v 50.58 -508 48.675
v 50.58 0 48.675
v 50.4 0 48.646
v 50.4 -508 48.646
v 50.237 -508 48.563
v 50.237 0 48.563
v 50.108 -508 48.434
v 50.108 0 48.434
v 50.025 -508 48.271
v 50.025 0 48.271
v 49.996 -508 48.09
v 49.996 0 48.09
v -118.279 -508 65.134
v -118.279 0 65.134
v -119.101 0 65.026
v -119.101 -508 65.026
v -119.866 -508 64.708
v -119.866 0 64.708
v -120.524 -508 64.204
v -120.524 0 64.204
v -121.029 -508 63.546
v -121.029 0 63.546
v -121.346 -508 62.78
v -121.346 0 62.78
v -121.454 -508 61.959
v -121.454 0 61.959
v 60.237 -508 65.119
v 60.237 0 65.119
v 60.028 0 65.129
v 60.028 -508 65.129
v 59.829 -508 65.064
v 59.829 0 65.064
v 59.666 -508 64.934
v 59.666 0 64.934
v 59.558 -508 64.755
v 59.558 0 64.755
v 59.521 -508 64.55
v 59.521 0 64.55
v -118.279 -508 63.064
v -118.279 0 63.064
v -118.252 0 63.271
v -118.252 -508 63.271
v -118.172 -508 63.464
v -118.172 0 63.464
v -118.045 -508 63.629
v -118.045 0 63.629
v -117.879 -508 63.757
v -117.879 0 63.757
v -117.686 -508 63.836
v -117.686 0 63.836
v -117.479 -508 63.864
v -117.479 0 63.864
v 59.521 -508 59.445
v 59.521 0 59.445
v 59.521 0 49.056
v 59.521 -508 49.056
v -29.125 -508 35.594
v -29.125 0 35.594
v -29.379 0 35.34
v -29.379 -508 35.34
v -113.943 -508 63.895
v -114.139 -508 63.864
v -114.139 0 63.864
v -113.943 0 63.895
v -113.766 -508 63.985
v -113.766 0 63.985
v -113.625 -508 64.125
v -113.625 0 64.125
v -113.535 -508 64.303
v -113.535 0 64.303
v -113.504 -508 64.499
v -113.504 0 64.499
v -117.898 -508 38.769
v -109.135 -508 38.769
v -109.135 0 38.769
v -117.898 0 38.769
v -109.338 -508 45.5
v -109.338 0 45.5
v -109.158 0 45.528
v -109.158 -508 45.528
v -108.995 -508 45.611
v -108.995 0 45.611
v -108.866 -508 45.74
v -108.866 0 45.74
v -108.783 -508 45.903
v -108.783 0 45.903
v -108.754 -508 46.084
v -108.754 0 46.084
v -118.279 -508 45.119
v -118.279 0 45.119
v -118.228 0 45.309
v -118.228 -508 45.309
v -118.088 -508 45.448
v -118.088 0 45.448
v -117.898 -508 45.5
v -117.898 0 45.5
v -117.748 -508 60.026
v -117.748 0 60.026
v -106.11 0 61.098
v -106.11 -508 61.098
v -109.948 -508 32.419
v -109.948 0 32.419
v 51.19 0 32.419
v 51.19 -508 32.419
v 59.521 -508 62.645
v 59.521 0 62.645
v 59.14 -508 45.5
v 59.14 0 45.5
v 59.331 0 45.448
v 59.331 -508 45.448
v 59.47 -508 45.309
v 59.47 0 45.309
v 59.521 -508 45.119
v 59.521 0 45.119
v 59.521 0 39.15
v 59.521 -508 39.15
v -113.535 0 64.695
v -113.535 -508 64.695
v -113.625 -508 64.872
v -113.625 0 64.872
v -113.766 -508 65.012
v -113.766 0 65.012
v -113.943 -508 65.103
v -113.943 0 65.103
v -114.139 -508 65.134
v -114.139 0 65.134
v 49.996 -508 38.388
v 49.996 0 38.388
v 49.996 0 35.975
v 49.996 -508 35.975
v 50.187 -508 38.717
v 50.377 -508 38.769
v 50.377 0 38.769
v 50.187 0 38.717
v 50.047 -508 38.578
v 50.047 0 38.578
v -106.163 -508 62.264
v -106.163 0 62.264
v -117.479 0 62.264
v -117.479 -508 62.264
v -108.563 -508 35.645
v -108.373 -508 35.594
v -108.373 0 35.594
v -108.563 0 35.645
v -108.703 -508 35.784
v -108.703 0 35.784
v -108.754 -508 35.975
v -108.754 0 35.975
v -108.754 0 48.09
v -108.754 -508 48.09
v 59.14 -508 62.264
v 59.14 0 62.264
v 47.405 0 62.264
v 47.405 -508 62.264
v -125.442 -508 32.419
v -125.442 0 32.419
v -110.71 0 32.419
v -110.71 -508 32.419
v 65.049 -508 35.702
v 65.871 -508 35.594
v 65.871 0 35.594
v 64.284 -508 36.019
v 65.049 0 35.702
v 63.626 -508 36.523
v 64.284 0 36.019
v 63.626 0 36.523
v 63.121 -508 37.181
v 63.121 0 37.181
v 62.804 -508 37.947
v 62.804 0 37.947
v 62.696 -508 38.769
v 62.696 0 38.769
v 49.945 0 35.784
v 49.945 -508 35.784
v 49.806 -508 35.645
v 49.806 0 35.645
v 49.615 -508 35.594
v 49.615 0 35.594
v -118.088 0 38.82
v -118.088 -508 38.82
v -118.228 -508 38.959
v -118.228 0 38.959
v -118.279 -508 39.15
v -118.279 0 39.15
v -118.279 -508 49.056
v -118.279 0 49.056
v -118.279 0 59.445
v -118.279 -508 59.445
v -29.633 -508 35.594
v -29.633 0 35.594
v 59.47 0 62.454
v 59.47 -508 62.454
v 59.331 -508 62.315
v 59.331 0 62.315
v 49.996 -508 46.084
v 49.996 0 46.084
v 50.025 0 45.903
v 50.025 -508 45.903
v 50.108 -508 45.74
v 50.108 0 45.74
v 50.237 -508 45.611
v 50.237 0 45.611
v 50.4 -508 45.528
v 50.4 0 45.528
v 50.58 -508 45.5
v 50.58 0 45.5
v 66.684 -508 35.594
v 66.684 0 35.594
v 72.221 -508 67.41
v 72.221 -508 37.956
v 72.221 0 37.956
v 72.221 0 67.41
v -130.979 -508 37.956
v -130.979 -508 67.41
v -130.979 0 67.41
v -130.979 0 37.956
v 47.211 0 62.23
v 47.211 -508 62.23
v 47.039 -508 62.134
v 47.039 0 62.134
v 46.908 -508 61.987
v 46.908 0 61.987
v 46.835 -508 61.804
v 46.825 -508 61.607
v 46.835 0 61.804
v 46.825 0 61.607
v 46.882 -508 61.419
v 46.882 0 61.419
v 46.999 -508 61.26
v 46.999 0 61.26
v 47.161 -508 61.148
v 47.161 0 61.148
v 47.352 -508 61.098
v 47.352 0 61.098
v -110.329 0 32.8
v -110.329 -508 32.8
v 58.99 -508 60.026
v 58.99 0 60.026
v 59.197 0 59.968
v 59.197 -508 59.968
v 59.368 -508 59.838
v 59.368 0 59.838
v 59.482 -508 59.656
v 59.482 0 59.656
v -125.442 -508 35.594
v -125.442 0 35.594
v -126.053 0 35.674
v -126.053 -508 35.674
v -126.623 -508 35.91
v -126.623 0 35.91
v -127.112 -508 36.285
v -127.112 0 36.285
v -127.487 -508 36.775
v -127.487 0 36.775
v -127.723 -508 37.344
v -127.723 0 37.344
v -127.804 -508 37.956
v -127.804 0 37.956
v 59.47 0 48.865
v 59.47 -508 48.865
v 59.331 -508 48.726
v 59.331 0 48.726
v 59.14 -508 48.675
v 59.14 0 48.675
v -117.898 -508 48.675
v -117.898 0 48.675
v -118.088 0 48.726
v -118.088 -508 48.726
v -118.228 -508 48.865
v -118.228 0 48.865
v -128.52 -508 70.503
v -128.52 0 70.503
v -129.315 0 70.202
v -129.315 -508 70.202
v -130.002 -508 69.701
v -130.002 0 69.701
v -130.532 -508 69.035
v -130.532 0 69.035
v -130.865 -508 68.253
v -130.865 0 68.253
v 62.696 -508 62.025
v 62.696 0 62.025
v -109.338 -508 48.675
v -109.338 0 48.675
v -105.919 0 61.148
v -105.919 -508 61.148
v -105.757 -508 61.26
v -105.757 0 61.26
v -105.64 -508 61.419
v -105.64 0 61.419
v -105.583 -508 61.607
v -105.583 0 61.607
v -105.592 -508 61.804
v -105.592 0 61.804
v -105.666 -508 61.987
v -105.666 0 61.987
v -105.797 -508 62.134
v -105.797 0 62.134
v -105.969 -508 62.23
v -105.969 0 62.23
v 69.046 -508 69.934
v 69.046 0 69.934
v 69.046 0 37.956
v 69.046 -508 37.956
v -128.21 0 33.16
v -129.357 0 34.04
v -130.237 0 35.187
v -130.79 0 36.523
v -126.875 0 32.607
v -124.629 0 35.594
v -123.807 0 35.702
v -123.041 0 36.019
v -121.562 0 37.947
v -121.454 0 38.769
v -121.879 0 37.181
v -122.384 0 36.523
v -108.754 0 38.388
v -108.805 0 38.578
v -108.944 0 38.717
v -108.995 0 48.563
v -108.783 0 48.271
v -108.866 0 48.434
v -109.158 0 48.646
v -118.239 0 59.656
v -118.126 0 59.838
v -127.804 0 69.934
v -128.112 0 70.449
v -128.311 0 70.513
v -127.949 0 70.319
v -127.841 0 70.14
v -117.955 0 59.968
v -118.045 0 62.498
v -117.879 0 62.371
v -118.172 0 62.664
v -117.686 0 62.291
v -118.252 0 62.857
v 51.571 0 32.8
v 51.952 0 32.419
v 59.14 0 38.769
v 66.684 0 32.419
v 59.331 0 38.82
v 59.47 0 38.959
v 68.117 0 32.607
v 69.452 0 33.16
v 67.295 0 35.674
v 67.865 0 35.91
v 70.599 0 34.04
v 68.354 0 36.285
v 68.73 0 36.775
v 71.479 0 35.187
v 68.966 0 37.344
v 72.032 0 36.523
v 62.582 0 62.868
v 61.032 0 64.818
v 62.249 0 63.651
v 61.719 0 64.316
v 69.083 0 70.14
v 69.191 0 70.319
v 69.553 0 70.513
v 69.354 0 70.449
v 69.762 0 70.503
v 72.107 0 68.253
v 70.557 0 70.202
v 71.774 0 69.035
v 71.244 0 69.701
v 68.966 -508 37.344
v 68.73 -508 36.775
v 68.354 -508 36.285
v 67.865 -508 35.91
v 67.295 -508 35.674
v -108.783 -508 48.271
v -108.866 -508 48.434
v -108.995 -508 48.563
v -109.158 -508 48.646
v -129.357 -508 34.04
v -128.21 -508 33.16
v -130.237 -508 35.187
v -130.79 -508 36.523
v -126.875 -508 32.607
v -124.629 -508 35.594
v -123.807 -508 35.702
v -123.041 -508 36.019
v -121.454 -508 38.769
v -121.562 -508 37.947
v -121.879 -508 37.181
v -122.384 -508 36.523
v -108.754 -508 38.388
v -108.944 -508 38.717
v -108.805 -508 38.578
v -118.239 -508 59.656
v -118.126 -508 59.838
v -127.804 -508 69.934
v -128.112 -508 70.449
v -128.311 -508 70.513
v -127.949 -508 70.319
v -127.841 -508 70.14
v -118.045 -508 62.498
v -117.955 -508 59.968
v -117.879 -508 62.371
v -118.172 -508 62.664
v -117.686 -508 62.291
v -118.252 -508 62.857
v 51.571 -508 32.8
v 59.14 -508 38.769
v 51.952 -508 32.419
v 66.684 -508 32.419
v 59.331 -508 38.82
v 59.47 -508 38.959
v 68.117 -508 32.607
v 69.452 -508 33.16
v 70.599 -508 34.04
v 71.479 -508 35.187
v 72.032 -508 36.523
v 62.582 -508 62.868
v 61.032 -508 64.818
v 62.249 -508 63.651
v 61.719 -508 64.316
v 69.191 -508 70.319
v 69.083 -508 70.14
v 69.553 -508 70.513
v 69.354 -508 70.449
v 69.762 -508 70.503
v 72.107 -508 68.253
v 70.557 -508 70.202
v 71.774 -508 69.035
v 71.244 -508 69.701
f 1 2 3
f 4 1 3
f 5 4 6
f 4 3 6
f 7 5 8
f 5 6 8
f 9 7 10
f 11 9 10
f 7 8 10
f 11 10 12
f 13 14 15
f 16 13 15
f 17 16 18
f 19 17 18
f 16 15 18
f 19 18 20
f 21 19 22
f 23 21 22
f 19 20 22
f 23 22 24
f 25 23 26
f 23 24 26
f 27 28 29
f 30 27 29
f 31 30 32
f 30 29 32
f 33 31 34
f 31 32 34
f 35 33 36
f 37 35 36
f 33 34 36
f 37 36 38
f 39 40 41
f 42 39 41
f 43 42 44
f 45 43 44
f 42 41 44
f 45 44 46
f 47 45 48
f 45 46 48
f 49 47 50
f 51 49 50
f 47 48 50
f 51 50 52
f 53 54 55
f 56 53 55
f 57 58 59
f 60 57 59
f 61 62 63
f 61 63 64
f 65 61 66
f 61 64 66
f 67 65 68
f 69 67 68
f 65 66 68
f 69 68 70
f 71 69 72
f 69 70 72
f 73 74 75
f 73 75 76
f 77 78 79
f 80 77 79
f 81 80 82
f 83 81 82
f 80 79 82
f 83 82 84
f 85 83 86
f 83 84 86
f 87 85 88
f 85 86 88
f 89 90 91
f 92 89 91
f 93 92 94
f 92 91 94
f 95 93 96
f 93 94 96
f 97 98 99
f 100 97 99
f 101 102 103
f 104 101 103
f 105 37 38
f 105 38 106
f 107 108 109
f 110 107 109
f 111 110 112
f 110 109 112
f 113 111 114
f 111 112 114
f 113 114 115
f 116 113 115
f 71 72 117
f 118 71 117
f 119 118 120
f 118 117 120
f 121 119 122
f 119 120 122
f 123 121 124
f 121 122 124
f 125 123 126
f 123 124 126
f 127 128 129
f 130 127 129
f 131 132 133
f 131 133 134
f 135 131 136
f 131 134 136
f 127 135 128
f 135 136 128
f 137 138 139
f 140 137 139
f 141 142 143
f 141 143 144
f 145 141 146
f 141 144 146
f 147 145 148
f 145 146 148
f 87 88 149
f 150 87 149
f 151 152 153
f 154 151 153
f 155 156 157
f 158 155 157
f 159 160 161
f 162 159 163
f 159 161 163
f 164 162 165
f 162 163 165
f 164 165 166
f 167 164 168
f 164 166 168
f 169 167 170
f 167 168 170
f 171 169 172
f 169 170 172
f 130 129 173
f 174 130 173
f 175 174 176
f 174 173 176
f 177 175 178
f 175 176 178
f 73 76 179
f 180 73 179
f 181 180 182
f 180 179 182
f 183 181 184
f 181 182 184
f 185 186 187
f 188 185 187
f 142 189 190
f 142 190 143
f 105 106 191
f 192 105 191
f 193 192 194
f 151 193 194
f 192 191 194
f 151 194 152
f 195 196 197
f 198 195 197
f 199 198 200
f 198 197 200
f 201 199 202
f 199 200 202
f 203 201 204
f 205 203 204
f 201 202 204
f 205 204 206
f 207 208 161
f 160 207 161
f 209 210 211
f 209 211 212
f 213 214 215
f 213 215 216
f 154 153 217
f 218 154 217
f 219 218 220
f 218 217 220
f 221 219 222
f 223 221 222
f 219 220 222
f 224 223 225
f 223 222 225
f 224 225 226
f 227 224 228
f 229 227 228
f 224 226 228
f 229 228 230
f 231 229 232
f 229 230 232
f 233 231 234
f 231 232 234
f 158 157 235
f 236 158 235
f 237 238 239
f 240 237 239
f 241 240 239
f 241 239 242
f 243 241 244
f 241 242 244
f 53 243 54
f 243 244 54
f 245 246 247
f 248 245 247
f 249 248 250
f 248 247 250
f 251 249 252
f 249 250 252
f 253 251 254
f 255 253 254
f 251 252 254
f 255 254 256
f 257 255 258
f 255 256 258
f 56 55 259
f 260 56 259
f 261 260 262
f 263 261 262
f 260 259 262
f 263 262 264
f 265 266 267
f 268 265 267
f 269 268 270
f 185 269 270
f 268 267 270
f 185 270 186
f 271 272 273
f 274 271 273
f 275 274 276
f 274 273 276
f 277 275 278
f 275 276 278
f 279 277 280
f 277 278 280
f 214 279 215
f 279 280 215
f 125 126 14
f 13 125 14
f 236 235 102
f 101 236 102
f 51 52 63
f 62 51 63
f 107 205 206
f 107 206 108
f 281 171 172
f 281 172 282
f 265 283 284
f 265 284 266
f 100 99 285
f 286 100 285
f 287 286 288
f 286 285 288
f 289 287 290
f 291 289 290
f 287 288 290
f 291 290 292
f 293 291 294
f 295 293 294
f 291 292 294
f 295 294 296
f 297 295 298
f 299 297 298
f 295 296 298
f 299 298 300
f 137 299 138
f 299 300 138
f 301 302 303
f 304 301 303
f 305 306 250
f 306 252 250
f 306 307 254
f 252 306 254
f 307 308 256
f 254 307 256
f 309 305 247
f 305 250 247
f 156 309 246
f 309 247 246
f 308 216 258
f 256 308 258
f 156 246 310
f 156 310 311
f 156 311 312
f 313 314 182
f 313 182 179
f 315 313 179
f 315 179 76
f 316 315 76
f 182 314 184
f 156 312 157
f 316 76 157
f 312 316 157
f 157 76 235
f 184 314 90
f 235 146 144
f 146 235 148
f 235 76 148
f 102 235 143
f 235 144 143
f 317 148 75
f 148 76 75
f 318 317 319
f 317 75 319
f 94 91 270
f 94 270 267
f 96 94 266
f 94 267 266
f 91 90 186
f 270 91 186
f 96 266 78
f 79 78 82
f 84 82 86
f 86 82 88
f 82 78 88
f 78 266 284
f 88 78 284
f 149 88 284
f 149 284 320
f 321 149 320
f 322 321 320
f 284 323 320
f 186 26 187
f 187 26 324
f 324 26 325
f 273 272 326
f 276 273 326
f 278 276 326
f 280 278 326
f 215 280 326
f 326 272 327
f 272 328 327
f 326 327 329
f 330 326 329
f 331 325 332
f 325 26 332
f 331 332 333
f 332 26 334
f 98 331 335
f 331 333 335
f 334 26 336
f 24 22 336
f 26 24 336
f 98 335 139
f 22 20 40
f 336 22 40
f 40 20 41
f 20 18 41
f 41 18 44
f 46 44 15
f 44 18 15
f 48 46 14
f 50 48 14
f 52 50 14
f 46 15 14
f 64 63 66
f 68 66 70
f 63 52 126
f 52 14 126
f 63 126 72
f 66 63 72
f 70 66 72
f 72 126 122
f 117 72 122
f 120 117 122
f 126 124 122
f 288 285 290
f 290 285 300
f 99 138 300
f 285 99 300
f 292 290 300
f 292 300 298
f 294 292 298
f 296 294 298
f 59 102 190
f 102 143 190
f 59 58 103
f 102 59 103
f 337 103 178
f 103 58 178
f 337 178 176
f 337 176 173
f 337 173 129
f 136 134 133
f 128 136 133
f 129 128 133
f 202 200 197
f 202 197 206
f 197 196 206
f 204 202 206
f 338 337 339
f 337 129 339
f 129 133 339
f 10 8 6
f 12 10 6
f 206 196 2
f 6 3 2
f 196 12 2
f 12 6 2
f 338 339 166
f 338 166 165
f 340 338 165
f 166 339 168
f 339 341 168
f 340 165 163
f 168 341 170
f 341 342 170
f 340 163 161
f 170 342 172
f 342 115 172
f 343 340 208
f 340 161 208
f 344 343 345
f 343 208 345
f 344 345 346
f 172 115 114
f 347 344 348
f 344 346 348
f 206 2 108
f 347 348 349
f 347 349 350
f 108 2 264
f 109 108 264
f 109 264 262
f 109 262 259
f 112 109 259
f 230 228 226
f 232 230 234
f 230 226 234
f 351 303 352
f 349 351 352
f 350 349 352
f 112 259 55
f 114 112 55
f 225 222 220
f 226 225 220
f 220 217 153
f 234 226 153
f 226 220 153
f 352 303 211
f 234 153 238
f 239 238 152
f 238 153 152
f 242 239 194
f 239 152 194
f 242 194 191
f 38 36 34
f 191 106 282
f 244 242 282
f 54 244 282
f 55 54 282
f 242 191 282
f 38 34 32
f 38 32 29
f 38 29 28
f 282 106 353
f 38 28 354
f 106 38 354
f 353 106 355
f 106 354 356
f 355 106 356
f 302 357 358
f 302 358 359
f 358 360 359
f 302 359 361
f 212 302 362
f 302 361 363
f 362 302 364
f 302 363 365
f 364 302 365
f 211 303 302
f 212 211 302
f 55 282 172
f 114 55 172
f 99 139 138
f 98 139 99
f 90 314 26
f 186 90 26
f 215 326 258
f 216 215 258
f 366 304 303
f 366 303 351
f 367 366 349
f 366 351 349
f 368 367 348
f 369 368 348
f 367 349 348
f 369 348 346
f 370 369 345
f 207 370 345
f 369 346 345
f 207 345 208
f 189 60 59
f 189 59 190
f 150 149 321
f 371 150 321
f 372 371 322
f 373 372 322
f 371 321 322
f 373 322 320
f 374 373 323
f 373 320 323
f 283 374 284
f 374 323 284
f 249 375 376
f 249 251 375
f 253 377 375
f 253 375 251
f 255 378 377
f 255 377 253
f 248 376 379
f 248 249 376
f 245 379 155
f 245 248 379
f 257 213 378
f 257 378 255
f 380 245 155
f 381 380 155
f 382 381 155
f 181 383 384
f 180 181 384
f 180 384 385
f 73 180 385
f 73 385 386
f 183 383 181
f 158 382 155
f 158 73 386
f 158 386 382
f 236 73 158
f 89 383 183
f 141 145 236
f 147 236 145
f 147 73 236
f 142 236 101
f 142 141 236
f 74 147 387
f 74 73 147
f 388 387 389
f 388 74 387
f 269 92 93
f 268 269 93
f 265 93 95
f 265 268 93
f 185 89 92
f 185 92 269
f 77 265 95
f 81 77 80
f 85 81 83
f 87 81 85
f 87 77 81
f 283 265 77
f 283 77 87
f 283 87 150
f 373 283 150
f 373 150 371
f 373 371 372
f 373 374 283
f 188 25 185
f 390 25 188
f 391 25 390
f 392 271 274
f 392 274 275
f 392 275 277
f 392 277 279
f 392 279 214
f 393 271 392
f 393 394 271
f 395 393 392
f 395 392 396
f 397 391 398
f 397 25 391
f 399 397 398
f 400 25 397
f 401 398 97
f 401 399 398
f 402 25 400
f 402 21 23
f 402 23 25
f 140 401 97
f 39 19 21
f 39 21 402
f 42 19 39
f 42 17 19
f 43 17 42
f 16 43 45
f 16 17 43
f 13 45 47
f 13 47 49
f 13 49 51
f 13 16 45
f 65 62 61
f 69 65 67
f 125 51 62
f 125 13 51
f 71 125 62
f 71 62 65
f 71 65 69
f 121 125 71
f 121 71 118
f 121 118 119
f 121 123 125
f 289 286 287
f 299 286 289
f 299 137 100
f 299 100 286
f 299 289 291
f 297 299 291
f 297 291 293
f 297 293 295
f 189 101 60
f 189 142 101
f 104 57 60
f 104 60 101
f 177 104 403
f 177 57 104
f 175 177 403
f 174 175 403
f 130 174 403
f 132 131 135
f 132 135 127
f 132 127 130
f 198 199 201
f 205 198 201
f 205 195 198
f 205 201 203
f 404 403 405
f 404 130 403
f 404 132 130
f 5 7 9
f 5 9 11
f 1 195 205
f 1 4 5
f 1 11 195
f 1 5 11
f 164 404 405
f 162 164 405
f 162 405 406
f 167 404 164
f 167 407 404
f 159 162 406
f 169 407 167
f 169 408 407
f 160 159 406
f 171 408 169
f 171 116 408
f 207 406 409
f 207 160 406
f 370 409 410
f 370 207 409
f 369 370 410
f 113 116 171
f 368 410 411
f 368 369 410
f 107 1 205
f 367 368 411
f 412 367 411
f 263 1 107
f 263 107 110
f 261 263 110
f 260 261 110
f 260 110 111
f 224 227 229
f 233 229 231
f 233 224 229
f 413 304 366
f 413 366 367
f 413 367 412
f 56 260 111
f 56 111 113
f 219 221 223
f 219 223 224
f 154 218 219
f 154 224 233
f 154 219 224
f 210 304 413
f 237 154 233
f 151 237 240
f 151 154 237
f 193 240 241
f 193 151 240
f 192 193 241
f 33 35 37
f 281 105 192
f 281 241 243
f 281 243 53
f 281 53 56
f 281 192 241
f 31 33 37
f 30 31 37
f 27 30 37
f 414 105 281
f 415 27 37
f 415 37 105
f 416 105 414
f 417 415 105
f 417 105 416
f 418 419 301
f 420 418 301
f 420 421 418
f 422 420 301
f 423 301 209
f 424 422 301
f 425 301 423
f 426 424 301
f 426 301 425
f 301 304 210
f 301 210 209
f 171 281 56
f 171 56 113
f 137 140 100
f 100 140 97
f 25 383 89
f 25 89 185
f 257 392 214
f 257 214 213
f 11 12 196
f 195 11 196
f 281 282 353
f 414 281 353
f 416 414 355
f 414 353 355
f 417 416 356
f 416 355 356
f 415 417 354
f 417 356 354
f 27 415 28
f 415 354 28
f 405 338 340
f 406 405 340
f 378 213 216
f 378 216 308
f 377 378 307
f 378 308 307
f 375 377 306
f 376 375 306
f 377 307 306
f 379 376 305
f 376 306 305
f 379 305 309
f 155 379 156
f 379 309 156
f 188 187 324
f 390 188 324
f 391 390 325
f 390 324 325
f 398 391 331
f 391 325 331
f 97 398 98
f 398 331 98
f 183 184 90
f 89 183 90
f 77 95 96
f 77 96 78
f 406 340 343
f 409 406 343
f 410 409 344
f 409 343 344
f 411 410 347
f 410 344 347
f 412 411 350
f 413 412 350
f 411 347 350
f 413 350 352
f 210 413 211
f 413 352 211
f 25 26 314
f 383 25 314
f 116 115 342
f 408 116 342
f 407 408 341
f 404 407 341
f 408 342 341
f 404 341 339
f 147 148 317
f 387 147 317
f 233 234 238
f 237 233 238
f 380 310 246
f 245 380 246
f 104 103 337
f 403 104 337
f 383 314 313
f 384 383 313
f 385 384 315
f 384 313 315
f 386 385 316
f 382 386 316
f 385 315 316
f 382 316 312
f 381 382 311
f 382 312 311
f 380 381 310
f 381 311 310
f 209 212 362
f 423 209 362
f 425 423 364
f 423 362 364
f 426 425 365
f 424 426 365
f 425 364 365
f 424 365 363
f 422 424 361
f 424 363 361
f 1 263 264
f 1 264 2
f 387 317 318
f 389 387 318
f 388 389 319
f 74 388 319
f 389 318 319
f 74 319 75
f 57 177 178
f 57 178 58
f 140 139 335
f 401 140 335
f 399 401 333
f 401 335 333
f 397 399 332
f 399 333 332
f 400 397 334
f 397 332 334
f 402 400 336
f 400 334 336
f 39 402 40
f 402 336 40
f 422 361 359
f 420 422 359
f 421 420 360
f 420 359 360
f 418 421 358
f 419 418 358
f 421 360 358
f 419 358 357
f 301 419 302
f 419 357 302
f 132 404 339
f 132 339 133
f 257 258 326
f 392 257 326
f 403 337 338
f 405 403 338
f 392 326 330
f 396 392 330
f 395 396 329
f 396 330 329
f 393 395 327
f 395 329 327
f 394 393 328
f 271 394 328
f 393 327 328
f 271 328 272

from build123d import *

# Parameters (mm, degrees)
F1_DEPTH = 508


# Not quite as in the source:
# - ends of sketch curves that miss each other by under 0.0002 mm in the source are joined


with BuildPart() as f1:
    # F0 (on Front) → F1 (new body)
    with BuildSketch(Plane.XZ):
        with BuildLine():
            Line((-125.4417608, 32.418528), (-110.7097608, 32.418528))
            Line((-110.7097608, 32.418528), (-110.3287608, 32.799528))
            Line((-110.3287608, 32.799528), (-109.9477608, 32.418528))
            Line((-109.9477608, 32.418528), (51.1898392, 32.418528))
            Line((51.1898392, 32.418528), (51.5708392, 32.799528))
            Line((51.5708392, 32.799528), (51.9518392, 32.418528))
            Line((51.9518392, 32.418528), (66.6838392, 32.418528))
            ThreePointArc((66.6838392, 32.418528), (70.5992308688, 34.0403363312), (72.2210392, 37.955728))
            Line((72.2210392, 37.955728), (72.2210392, 67.4102538))
            ThreePointArc((72.2210392, 67.4102538), (71.5313659528, 69.3860513433), (69.7619677468, 70.5034837164))
            ThreePointArc((69.7619677468, 70.5034837164), (69.2666914482, 70.3916273244), (69.0460392, 69.934328))
            Line((69.0460392, 69.934328), (69.0460392, 37.955728))
            ThreePointArc((69.0460392, 37.955728), (68.3541668385, 36.2854003615), (66.6838392, 35.593528))
            Line((66.6838392, 35.593528), (65.8710392, 35.593528))
            ThreePointArc((65.8710392, 35.593528), (63.6259751697, 36.5234639697), (62.6960392, 38.768528))
            Line((62.6960392, 38.768528), (62.6960392, 62.0254538))
            ThreePointArc((62.6960392, 62.0254538), (62.0063659528, 64.0012513433), (60.2369677468, 65.1186837164))
            ThreePointArc((60.2369677468, 65.1186837164), (59.7416914482, 65.0068273244), (59.5210392, 64.549528))
            Line((59.5210392, 64.549528), (59.5210392, 62.644528))
            ThreePointArc((59.5210392, 62.644528), (59.4094468836, 62.3751203164), (59.1400392, 62.263528))
            Line((59.1400392, 62.263528), (47.4052392, 62.263528))
            ThreePointArc((47.4052392, 62.263528), (46.8216542466, 61.706128041), (47.3516955482, 61.0975868915))
            Line((47.3516955482, 61.0975868915), (58.9903824, 60.0263722))
            ThreePointArc((58.9903824, 60.0263722), (59.3684465687, 59.8383423872), (59.5210392, 59.444636))
            Line((59.5210392, 59.444636), (59.5210392, 49.055528))
            ThreePointArc((59.5210392, 49.055528), (59.4094468836, 48.7861203164), (59.1400392, 48.674528))
            Line((59.1400392, 48.674528), (50.5802392, 48.674528))
            ThreePointArc((50.5802392, 48.674528), (50.1671474184, 48.5034197816), (49.9960392, 48.090328))
            Line((49.9960392, 48.090328), (49.9960392, 46.083728))
            ThreePointArc((49.9960392, 46.083728), (50.1671474184, 45.6706362184), (50.5802392, 45.499528))
            Line((50.5802392, 45.499528), (59.1400392, 45.499528))
            ThreePointArc((59.1400392, 45.499528), (59.4094468836, 45.3879356836), (59.5210392, 45.118528))
            Line((59.5210392, 45.118528), (59.5210392, 39.149528))
            ThreePointArc((59.5210392, 39.149528), (59.4094468836, 38.8801203164), (59.1400392, 38.768528))
            Line((59.1400392, 38.768528), (50.3770392, 38.768528))
            ThreePointArc((50.3770392, 38.768528), (50.1076315164, 38.6569356836), (49.9960392, 38.387528))
            Line((49.9960392, 38.387528), (49.9960392, 35.974528))
            ThreePointArc((49.9960392, 35.974528), (49.8844468836, 35.7051203164), (49.6150392, 35.593528))
            Line((49.6150392, 35.593528), (-29.1249608, 35.593528))
            Line((-29.1249608, 35.593528), (-29.3789608, 35.339528))
            Line((-29.3789608, 35.339528), (-29.6329608, 35.593528))
            Line((-29.6329608, 35.593528), (-108.3729608, 35.593528))
            ThreePointArc((-108.3729608, 35.593528), (-108.6423684836, 35.7051203164), (-108.7539608, 35.974528))
            Line((-108.7539608, 35.974528), (-108.7539608, 38.387528))
            ThreePointArc((-108.7539608, 38.387528), (-108.8655531164, 38.6569356836), (-109.1349608, 38.768528))
            Line((-109.1349608, 38.768528), (-117.8979608, 38.768528))
            ThreePointArc((-117.8979608, 38.768528), (-118.1673684836, 38.8801203164), (-118.2789608, 39.149528))
            Line((-118.2789608, 39.149528), (-118.2789608, 45.118528))
            ThreePointArc((-118.2789608, 45.118528), (-118.1673684836, 45.3879356836), (-117.8979608, 45.499528))
            Line((-117.8979608, 45.499528), (-109.3381608, 45.499528))
            ThreePointArc((-109.3381608, 45.499528), (-108.9250690184, 45.6706362184), (-108.7539608, 46.083728))
            Line((-108.7539608, 46.083728), (-108.7539608, 48.090328))
            ThreePointArc((-108.7539608, 48.090328), (-108.9250690184, 48.5034197816), (-109.3381608, 48.674528))
            Line((-109.3381608, 48.674528), (-117.8979608, 48.674528))
            ThreePointArc((-117.8979608, 48.674528), (-118.1673684836, 48.7861203164), (-118.2789608, 49.055528))
            Line((-118.2789608, 49.055528), (-118.2789608, 59.444636))
            ThreePointArc((-118.2789608, 59.444636), (-118.1263681687, 59.8383423872), (-117.7483044518, 60.0263771085))
            Line((-117.7483044518, 60.0263771085), (-106.1096176, 61.0975918))
            ThreePointArc((-106.1096176, 61.0975918), (-105.5795758466, 61.706128041), (-106.1631608, 62.263528))
            Line((-106.1631608, 62.263528), (-117.4788608, 62.263528))
            ThreePointArc((-117.4788608, 62.263528), (-118.0446169356, 62.4978718644), (-118.2789608, 63.063628))
            ThreePointArc((-118.2789608, 63.063628), (-118.0446169356, 63.6293841356), (-117.4788608, 63.863728))
            Line((-117.4788608, 63.863728), (-114.1387608, 63.863728))
            ThreePointArc((-114.1387608, 63.863728), (-113.6897479939, 64.0497151939), (-113.5037608, 64.498728))
            ThreePointArc((-113.5037608, 64.498728), (-113.6897479939, 64.9477408061), (-114.1387608, 65.133728))
            Line((-114.1387608, 65.133728), (-118.2789608, 65.133728))
            ThreePointArc((-118.2789608, 65.133728), (-120.5240248303, 64.2037920303), (-121.4539608, 61.958728))
            Line((-121.4539608, 61.958728), (-121.4539608, 38.768528))
            ThreePointArc((-121.4539608, 38.768528), (-122.3838967697, 36.5234639697), (-124.6289608, 35.593528))
            Line((-124.6289608, 35.593528), (-125.4417608, 35.593528))
            ThreePointArc((-125.4417608, 35.593528), (-127.1120884385, 36.2854003615), (-127.8039608, 37.955728))
            Line((-127.8039608, 37.955728), (-127.8039608, 69.934328))
            ThreePointArc((-127.8039608, 69.934328), (-128.0246130482, 70.3916273244), (-128.5198891538, 70.503482883))
            ThreePointArc((-128.5198891538, 70.503482883), (-130.2892875528, 69.3860513433), (-130.9789608, 67.4102538))
            Line((-130.9789608, 67.4102538), (-130.9789608, 37.955728))
            ThreePointArc((-130.9789608, 37.955728), (-129.3571524688, 34.0403363312), (-125.4417608, 32.418528))
        make_face()
    extrude(amount=F1_DEPTH)


solid = f1.part
